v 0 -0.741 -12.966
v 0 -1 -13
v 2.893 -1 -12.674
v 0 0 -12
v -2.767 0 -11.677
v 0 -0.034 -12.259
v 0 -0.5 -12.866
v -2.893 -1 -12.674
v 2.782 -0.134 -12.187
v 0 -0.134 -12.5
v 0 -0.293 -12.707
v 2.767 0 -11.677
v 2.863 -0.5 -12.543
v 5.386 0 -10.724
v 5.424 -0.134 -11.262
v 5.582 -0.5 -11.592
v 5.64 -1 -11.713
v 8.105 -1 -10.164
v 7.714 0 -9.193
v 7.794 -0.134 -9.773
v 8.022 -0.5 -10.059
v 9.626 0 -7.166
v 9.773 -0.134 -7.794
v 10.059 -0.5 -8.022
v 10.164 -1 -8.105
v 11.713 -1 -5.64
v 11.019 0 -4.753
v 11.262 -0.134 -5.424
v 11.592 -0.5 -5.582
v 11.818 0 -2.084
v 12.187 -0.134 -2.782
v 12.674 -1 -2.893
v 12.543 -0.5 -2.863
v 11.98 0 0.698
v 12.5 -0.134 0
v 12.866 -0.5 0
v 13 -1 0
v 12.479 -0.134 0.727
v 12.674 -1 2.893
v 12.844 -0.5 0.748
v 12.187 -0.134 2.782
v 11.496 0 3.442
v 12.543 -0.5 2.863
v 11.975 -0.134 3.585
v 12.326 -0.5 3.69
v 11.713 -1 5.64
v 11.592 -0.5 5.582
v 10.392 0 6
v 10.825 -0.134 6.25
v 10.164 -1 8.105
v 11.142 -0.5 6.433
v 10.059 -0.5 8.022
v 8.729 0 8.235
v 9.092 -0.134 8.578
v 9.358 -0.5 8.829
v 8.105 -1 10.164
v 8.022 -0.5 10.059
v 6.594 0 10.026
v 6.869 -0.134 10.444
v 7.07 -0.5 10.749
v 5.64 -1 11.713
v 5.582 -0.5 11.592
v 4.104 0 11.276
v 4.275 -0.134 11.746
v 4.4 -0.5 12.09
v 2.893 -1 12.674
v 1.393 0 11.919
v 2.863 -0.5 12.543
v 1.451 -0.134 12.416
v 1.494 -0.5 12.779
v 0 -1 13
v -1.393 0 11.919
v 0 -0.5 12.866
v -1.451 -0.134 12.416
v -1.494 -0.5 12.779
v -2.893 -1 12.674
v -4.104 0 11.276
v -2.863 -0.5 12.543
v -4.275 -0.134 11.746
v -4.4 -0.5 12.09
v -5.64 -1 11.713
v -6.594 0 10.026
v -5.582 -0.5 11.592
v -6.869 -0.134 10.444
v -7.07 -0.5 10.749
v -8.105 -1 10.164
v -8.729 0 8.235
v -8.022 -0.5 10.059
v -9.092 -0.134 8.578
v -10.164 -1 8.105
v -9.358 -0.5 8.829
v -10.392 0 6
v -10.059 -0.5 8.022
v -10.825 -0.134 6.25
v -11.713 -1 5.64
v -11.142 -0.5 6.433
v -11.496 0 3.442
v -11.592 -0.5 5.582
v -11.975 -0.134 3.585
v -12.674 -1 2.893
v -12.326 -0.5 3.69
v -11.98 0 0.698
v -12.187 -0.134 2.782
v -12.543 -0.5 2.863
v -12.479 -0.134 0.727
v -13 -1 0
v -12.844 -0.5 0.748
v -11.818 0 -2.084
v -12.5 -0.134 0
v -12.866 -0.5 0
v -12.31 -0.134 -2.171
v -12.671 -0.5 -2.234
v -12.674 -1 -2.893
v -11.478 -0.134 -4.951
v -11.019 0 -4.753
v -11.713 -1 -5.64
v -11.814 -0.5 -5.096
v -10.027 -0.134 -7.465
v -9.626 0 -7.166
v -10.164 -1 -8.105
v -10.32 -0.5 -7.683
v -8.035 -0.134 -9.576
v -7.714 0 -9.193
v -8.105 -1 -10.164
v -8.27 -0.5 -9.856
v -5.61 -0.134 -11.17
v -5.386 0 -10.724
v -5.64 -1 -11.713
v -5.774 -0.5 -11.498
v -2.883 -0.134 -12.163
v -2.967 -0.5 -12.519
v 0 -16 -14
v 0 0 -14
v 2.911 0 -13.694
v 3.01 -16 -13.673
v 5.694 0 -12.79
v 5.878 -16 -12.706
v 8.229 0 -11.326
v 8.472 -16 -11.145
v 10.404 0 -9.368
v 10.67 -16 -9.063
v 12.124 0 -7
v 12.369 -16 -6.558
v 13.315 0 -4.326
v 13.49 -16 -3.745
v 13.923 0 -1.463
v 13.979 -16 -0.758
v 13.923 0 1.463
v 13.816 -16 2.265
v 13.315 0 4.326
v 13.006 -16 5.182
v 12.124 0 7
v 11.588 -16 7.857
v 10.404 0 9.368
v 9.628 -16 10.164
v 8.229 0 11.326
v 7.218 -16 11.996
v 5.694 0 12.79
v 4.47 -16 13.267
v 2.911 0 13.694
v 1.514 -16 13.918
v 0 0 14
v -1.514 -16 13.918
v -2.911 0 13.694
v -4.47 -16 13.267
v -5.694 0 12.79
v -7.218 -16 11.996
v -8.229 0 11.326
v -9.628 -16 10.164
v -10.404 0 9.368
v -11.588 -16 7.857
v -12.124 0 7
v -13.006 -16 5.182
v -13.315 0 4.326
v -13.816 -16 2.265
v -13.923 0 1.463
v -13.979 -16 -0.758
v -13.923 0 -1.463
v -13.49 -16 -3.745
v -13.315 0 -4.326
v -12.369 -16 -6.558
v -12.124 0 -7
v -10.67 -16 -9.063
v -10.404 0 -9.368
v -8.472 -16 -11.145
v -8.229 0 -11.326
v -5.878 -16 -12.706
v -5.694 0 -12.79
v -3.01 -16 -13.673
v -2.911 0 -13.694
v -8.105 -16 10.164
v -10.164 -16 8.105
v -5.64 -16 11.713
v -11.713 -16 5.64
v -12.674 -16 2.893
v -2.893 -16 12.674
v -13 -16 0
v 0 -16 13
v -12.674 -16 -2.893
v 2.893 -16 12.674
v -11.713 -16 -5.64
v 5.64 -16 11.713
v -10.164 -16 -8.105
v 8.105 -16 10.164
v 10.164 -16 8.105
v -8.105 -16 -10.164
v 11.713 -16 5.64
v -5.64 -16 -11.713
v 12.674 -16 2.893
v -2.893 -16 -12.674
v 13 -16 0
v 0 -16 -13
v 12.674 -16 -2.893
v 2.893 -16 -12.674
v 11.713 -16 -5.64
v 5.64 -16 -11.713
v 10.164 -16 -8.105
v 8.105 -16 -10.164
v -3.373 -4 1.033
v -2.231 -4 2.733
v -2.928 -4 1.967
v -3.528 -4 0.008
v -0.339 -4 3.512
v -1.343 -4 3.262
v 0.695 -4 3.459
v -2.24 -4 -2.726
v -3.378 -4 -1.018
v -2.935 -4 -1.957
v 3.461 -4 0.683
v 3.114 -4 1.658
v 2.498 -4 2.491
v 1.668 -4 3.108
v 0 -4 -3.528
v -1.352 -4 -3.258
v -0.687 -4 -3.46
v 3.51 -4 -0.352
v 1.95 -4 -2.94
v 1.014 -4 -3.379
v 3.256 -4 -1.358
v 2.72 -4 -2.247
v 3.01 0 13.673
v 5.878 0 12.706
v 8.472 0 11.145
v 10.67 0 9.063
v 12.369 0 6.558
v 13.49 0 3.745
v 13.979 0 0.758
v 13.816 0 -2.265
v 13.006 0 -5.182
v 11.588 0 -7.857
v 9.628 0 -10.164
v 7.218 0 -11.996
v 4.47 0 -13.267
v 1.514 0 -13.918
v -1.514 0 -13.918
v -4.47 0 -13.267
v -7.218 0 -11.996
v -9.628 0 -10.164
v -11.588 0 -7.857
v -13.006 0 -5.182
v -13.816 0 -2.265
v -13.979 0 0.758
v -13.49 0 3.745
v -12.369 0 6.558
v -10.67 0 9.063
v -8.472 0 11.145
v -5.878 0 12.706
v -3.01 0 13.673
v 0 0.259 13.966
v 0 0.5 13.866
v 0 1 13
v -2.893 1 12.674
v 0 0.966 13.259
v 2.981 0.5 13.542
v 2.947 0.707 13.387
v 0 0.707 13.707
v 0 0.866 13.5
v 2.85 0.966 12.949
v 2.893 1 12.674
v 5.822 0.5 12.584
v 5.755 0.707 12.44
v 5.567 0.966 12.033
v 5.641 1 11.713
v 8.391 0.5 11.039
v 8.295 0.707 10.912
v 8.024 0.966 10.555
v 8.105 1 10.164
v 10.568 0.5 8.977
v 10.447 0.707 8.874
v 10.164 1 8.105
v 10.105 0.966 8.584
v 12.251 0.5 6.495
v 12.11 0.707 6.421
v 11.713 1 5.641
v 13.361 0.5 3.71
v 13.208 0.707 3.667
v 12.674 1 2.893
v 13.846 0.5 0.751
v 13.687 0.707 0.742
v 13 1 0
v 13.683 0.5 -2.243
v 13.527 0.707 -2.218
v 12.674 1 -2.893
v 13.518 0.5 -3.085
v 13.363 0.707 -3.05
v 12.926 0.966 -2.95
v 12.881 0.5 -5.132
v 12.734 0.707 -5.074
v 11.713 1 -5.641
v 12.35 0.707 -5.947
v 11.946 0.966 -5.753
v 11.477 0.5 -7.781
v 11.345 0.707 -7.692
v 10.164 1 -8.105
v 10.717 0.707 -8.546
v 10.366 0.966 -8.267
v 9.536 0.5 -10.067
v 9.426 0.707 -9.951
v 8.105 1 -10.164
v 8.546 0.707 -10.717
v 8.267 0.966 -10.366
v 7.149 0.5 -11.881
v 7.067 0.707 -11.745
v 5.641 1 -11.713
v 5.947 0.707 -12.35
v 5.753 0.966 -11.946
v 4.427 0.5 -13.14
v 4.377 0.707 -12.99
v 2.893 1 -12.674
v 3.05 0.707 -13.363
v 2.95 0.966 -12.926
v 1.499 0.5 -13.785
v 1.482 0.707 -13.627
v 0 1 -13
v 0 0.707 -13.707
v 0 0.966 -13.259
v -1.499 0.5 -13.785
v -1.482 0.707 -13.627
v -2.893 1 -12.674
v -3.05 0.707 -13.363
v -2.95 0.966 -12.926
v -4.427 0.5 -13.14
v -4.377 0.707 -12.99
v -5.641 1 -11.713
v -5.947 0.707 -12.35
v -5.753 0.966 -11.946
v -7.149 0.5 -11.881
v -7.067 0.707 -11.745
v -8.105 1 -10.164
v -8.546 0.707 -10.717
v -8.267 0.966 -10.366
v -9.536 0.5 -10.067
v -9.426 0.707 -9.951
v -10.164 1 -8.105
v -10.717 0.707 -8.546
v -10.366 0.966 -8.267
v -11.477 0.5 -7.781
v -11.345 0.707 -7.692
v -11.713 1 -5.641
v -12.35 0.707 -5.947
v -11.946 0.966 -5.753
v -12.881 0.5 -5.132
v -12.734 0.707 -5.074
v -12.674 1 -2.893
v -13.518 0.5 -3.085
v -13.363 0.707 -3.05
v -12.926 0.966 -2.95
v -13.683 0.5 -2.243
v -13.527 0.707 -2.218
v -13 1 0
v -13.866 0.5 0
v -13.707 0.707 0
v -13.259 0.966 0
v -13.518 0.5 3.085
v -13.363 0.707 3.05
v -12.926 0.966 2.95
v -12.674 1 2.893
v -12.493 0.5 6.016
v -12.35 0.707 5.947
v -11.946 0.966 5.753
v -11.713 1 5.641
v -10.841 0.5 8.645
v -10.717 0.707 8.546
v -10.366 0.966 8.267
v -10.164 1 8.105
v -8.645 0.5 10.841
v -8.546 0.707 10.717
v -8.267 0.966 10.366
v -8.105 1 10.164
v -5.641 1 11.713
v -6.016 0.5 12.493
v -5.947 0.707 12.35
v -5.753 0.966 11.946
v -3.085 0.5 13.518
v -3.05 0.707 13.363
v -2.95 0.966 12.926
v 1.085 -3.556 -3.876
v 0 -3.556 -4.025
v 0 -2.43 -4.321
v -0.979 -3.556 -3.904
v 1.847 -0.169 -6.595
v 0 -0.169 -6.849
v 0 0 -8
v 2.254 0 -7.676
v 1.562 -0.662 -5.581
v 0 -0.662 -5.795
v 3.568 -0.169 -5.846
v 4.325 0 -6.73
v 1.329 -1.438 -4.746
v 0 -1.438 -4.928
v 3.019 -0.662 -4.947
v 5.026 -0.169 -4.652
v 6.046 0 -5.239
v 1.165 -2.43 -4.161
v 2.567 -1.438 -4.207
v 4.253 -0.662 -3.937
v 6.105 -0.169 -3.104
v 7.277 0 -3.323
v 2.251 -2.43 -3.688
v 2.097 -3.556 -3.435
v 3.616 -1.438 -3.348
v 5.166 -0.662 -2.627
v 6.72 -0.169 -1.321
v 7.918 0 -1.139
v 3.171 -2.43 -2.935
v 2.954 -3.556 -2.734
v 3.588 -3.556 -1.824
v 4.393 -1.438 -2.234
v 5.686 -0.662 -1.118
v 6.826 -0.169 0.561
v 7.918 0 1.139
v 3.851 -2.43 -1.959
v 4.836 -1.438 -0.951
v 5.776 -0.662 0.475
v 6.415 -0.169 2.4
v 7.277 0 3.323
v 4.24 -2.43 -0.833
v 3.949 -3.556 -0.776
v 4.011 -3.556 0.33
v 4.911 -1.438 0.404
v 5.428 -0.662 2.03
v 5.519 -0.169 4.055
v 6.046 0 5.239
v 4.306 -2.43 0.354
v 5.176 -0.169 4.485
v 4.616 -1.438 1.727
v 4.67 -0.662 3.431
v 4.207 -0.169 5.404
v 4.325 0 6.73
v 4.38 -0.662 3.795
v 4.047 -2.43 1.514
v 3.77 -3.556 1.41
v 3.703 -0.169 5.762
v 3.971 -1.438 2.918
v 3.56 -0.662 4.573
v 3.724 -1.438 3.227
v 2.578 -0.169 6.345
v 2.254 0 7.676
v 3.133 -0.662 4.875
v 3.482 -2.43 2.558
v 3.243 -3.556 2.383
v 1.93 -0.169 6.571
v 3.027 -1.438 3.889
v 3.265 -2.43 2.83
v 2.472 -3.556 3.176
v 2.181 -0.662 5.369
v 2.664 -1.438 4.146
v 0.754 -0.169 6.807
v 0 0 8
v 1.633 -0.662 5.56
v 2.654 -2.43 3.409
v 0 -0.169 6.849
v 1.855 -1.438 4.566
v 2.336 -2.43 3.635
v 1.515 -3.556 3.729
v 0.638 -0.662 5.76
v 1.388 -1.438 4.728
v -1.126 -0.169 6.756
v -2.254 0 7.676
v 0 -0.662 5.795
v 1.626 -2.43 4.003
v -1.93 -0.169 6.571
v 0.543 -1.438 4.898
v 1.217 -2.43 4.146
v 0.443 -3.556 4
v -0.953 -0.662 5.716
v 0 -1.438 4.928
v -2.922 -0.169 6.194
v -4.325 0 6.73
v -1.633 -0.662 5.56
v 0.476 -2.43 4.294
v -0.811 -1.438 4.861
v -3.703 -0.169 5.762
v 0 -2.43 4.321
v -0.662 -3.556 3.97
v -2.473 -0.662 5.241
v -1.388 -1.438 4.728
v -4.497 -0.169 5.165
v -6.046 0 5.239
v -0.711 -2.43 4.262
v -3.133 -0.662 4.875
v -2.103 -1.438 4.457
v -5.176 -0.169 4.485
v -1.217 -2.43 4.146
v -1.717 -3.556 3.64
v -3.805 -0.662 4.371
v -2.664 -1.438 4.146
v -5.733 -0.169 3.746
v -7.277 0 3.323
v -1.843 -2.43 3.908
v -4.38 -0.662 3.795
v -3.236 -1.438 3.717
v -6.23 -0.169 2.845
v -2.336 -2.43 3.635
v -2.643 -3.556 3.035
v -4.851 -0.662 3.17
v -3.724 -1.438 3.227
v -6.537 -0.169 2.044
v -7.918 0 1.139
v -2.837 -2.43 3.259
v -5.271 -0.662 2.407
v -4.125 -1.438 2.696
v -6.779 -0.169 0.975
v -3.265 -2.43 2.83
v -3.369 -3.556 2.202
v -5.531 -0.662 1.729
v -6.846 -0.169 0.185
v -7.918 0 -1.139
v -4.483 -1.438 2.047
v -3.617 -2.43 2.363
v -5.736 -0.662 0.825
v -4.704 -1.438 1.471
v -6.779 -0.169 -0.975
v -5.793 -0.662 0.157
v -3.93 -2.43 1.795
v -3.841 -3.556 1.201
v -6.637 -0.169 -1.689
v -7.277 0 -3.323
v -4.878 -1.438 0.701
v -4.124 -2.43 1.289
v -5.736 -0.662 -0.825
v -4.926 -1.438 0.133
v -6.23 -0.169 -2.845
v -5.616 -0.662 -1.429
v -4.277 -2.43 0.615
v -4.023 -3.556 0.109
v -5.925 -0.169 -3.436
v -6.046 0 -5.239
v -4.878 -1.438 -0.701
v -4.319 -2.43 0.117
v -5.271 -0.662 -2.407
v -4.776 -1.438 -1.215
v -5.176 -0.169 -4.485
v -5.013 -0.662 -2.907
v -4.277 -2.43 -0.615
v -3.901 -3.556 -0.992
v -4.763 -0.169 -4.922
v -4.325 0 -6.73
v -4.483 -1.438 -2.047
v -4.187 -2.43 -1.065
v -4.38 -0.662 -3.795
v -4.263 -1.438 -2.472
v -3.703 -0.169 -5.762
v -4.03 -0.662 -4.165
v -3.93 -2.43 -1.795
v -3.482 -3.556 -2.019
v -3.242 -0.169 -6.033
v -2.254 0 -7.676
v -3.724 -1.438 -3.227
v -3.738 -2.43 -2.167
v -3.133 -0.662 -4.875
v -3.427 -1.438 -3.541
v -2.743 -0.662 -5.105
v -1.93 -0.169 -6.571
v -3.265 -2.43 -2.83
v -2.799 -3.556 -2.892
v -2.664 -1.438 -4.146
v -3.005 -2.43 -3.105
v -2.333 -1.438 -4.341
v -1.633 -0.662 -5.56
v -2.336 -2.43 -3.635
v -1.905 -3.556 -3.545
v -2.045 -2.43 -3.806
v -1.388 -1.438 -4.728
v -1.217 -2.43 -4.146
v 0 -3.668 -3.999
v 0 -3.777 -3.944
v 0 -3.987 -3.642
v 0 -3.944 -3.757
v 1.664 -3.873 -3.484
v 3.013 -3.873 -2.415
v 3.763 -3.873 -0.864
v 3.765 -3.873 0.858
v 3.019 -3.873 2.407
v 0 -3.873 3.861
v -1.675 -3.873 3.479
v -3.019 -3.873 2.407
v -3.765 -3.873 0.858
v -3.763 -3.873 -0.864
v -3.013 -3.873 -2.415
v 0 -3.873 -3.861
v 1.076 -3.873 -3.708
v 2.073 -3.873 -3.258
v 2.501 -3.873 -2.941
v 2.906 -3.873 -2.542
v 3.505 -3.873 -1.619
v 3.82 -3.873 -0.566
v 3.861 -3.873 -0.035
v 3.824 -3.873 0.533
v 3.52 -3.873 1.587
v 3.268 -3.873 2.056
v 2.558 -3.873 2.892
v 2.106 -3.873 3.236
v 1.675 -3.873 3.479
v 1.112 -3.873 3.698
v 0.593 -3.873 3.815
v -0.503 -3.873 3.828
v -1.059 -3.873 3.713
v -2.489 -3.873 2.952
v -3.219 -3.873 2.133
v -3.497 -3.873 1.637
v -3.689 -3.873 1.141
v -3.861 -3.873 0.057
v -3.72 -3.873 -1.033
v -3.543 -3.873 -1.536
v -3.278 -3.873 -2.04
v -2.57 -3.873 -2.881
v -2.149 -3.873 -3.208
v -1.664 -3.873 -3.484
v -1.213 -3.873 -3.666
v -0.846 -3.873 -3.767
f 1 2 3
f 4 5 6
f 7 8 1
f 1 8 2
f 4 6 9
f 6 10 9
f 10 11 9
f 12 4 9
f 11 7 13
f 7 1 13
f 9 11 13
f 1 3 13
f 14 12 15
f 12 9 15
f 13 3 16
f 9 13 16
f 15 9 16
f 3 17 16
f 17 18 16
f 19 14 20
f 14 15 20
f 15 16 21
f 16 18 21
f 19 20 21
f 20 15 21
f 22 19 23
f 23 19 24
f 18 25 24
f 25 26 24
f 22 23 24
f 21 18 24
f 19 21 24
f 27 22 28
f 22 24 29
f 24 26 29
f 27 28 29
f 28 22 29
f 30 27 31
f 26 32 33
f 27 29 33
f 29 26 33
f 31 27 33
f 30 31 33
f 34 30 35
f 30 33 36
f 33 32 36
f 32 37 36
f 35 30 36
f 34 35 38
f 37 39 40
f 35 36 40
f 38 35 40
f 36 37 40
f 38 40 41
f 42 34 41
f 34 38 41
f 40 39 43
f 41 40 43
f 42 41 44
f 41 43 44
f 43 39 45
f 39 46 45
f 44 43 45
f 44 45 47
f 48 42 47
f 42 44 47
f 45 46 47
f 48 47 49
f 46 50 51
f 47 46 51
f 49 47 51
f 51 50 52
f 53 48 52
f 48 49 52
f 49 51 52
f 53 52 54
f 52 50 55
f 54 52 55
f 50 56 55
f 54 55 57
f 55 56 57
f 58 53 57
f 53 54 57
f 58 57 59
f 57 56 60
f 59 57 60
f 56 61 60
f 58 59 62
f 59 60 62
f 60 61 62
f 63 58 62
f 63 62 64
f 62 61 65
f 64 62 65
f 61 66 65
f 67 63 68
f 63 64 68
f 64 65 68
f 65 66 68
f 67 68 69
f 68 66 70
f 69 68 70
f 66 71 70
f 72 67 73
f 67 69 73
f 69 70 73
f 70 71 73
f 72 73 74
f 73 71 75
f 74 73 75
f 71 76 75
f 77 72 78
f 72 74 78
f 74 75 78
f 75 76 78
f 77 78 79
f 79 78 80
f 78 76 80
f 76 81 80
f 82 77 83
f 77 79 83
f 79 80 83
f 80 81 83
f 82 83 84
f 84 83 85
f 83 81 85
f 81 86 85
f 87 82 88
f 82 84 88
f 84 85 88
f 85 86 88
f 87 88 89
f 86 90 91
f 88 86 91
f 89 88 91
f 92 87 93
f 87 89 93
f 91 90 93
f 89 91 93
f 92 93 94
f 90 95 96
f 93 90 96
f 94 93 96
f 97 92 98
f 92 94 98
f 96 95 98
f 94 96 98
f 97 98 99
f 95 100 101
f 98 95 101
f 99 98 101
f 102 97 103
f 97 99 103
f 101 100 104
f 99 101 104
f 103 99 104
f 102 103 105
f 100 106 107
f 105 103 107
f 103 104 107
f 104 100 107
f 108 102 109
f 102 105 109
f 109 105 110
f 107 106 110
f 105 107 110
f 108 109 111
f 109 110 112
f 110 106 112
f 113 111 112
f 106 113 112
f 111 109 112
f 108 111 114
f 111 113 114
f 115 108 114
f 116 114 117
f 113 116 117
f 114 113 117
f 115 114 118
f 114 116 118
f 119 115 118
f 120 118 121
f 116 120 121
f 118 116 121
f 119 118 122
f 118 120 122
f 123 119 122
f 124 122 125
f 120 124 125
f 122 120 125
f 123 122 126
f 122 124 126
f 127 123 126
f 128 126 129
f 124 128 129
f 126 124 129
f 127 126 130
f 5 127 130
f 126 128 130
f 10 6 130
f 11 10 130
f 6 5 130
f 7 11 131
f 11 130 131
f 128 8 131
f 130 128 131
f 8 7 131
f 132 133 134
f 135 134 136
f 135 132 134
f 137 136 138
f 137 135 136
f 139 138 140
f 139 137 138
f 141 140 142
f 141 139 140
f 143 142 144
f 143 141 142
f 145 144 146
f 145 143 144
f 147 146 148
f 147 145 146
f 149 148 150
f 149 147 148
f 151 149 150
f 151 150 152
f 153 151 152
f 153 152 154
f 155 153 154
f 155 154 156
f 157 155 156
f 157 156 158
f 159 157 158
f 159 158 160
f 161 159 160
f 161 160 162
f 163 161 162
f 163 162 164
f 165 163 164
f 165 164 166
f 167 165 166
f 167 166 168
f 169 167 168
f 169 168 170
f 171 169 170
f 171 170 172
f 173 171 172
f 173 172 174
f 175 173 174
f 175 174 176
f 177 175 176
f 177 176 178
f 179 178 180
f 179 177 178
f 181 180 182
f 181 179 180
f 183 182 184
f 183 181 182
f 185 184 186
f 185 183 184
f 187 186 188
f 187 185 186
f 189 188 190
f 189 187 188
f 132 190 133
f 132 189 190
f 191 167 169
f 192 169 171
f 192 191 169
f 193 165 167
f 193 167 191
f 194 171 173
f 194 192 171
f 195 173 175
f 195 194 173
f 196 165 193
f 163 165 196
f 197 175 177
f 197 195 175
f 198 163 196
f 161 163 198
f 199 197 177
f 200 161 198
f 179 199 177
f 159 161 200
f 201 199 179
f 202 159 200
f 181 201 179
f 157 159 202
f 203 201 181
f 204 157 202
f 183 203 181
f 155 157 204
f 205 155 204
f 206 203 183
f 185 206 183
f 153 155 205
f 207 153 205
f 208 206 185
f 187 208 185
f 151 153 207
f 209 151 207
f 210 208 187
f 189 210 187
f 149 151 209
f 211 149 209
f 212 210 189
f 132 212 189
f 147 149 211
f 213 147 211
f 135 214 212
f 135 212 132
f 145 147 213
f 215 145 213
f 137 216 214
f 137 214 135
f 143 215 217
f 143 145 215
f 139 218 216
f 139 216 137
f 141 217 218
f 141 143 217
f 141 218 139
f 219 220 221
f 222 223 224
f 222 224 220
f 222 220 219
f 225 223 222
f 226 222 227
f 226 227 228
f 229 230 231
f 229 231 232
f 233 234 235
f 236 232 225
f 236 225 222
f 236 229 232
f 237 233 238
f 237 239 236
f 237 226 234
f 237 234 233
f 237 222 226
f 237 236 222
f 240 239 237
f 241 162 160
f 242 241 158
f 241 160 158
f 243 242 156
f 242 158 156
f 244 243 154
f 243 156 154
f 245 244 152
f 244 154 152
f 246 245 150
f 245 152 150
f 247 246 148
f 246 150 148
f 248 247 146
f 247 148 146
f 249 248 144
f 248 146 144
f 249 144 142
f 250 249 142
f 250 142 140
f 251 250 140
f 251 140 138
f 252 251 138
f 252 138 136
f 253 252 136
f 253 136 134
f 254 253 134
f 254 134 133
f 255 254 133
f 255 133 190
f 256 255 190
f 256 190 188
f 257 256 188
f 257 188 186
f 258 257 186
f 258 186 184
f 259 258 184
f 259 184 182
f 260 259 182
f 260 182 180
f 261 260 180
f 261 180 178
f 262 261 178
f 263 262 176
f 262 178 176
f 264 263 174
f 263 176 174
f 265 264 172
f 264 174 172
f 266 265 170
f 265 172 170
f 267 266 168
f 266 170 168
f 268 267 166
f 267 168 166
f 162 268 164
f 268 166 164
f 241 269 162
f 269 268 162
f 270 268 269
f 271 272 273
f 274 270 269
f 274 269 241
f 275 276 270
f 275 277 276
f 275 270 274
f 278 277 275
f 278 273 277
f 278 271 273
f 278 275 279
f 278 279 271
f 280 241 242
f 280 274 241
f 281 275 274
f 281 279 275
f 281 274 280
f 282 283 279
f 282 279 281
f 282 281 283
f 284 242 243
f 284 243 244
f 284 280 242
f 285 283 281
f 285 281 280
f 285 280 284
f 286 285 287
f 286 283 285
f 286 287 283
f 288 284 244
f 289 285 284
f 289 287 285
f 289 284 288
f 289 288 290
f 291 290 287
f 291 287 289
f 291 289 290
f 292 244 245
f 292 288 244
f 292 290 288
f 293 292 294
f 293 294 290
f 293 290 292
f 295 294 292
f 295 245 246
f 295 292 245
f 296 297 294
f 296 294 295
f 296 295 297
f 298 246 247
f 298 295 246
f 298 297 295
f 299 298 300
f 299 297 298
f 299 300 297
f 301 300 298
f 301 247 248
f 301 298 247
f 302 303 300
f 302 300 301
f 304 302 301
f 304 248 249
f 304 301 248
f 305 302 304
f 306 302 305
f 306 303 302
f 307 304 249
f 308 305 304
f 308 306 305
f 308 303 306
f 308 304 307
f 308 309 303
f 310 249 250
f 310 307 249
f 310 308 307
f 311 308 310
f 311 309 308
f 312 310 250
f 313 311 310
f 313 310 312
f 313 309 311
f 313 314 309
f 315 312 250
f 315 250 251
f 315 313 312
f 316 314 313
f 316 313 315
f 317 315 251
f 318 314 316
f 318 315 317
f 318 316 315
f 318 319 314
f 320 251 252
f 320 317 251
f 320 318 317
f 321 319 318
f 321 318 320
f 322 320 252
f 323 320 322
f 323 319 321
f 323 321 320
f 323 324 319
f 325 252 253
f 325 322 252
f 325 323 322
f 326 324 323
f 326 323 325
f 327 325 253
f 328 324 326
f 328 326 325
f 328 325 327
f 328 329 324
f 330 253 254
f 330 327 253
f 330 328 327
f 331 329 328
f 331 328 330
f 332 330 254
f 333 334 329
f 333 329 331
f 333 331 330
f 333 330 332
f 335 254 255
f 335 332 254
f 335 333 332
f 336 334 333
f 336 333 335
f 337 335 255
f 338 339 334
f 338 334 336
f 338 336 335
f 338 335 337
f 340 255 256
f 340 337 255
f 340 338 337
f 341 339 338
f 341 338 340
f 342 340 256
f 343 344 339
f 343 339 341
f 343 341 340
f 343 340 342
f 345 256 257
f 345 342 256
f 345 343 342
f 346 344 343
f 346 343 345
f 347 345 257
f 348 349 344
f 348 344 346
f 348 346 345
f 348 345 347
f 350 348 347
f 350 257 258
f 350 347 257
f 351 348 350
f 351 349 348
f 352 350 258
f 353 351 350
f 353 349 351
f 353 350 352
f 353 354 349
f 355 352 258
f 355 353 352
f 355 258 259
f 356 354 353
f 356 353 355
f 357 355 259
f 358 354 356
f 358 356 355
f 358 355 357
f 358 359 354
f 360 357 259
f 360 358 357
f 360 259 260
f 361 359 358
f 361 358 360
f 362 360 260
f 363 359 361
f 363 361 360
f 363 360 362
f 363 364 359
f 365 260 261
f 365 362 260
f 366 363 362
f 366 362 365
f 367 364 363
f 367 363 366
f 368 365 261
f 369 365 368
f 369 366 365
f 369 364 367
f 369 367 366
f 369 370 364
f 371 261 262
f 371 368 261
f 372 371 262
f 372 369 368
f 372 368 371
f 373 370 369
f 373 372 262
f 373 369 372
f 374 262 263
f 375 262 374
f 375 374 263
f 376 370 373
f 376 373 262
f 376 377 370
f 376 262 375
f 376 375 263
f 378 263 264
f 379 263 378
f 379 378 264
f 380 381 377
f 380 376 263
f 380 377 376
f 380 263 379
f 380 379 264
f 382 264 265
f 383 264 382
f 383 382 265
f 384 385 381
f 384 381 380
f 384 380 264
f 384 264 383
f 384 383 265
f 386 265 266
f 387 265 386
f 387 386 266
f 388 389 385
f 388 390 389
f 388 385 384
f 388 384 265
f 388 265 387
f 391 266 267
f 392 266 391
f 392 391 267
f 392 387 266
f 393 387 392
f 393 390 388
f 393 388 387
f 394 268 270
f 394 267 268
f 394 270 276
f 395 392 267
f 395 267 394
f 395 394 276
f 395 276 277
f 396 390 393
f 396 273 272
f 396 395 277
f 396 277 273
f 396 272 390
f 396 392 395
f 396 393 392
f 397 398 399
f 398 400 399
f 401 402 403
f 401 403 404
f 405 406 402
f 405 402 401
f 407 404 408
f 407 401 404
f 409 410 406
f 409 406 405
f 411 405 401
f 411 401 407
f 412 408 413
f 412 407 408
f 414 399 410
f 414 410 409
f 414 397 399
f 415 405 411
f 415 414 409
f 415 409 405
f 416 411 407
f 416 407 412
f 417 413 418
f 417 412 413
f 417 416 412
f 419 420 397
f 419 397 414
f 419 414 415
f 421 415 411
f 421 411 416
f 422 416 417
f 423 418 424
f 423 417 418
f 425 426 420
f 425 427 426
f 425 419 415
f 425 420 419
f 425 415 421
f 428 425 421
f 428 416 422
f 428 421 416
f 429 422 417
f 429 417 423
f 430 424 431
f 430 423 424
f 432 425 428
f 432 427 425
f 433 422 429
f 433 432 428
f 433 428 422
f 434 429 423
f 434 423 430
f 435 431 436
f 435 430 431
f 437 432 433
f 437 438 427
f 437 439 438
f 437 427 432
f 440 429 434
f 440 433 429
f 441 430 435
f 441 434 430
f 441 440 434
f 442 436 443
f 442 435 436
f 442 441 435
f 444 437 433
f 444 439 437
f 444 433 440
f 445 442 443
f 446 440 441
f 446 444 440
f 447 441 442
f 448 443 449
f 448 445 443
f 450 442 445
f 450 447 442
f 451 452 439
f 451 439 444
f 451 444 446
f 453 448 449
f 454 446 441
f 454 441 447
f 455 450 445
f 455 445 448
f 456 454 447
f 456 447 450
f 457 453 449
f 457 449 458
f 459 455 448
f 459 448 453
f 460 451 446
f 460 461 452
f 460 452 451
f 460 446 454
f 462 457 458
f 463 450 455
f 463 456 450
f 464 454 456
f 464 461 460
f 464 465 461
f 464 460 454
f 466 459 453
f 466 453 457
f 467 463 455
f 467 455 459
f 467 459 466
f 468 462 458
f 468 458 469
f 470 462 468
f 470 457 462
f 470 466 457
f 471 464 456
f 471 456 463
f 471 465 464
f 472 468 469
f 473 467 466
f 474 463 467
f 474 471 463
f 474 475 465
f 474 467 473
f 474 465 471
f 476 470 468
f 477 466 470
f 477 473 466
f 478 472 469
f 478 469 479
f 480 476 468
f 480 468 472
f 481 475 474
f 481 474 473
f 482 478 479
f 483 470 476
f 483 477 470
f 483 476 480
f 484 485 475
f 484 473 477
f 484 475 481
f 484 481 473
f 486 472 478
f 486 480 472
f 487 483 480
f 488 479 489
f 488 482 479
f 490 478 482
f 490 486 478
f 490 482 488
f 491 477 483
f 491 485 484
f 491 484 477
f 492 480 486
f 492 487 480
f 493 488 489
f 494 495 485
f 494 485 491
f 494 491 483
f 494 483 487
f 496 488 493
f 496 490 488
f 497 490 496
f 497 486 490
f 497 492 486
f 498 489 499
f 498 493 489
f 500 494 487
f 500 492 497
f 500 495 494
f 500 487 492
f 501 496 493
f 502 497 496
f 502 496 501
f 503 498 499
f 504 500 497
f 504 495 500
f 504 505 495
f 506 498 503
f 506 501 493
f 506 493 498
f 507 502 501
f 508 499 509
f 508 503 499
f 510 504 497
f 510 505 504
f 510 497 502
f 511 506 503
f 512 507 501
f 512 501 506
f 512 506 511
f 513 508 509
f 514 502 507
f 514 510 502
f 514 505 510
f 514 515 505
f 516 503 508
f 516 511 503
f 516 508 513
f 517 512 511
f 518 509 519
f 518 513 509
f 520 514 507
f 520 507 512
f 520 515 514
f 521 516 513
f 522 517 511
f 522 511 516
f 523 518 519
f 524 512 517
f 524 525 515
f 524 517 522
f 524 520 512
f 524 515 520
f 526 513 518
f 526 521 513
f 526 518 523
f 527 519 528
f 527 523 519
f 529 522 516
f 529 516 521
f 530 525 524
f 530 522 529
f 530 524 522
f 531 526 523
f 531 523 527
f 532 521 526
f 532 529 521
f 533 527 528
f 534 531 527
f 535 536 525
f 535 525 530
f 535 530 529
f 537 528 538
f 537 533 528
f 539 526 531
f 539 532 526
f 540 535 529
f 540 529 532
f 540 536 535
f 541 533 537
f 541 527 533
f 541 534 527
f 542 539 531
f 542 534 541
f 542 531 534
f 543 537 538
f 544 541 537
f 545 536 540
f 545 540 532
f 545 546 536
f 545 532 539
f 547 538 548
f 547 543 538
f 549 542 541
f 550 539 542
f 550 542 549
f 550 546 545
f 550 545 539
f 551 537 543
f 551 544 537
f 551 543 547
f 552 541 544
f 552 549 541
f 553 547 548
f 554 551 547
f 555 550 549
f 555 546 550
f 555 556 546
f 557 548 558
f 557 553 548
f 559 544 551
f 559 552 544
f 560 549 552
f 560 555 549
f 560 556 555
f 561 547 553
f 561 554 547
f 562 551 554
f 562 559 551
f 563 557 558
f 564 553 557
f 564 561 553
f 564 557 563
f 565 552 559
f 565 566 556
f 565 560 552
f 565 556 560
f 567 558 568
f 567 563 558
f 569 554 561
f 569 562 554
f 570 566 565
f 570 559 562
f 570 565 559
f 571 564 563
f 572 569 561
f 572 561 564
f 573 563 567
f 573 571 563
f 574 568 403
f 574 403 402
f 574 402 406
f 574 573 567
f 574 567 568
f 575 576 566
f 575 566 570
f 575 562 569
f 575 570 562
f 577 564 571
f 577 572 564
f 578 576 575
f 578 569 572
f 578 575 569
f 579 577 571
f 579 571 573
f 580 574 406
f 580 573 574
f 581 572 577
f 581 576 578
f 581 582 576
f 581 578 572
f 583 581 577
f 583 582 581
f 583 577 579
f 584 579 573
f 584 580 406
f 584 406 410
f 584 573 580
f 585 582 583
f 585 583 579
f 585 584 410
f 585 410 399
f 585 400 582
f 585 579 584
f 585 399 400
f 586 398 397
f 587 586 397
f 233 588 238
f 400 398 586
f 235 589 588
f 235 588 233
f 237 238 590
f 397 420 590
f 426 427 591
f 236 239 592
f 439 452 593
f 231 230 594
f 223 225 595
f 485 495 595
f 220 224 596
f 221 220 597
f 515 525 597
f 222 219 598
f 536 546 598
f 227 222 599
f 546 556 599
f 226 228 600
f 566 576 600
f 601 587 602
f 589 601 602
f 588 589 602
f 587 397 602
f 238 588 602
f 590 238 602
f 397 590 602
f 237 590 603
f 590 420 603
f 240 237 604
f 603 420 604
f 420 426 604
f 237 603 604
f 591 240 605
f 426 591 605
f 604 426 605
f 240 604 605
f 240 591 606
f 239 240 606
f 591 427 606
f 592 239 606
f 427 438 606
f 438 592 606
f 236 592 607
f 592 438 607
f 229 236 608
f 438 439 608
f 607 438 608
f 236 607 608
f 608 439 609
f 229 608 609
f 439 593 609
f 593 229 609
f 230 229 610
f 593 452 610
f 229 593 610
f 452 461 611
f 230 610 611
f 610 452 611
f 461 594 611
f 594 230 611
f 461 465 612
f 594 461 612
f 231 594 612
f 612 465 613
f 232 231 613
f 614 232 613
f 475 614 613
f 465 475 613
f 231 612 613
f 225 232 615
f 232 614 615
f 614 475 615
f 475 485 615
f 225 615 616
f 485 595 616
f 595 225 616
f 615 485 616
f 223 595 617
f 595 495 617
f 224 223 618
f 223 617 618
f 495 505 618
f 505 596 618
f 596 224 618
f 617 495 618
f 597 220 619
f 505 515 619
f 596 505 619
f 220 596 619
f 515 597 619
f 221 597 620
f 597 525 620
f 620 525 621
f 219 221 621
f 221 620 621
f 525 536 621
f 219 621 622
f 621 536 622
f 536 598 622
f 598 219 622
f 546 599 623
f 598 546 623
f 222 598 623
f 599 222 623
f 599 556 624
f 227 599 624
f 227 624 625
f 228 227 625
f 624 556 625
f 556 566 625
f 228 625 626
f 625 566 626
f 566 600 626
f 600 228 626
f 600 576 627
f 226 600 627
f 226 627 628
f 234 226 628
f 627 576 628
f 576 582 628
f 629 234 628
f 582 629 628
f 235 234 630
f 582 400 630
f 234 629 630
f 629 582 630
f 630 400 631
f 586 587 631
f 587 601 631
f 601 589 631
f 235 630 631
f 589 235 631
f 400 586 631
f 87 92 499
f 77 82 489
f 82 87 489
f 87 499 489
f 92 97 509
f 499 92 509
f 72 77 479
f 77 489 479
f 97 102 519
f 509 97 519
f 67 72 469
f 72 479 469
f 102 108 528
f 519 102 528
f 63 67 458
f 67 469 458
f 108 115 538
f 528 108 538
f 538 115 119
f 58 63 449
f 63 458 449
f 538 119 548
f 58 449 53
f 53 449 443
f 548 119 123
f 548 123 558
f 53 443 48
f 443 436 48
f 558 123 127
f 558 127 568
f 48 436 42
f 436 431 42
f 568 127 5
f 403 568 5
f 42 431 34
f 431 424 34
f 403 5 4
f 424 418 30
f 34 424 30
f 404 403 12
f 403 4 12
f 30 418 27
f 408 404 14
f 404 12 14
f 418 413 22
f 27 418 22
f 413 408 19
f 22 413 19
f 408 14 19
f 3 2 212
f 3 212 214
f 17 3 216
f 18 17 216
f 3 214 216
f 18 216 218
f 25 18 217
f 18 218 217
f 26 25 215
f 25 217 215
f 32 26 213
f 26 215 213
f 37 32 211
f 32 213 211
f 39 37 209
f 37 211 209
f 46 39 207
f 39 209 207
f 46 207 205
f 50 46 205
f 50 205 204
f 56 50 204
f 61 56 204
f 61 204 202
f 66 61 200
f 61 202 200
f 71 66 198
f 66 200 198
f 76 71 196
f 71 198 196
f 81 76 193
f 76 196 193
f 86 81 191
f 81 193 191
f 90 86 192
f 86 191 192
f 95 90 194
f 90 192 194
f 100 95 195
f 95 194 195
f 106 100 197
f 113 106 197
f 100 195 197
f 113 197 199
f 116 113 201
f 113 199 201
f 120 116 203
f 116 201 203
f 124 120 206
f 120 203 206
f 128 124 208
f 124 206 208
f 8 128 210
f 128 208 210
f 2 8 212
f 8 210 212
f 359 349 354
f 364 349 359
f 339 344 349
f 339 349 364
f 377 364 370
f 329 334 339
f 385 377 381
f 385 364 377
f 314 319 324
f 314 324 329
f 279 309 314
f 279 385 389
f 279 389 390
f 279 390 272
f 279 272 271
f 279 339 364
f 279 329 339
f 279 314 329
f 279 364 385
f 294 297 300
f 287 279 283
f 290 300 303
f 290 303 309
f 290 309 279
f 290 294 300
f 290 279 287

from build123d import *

# Parameters (mm, degrees)
SKETCH1_R           = 14
SKETCH1_R_2         = 13
BOSS_EXTRUDE1_DEPTH = 1
SKETCH2_R           = 4
BOSS_EXTRUDE2_DEPTH = 4
BOSS_EXTRUDE3_START = 16
SKETCH2_4_R         = 14
SKETCH2_4_R_2       = 13
BOSS_EXTRUDE3_DEPTH = 16
FILLET1_R           = 4
FILLET2_R           = 0.5
FILLET3_R           = 1


with BuildPart() as part:
    # Sketch1 → Boss-Extrude1 (new body)
    # profile 1 of 2: a face of its own
    with BuildSketch(Plane(origin=(0, 0, 0), x_dir=(1, 0, 0), z_dir=(0, 1, 0))):
        with Locations(Location((0, 0, 0), (0, 0, 270))):
            Circle(SKETCH1_R)
        Circle(SKETCH1_R_2, mode=Mode.SUBTRACT)
    # profile 2 of 2: a face of its own
    with BuildSketch(Plane(origin=(0, 0, 0), x_dir=(1, 0, 0), z_dir=(0, 1, 0))):
        Circle(SKETCH1_R_2)
    extrude(amount=BOSS_EXTRUDE1_DEPTH)

    # Sketch2 → Boss-Extrude2 (add)
    with BuildSketch(Plane.XZ):
        with Locations(Location((0, 0, 0), (0, 0, 270))):
            Circle(SKETCH2_R)
    extrude(amount=BOSS_EXTRUDE2_DEPTH)

    # Sketch2<4> → Boss-Extrude3 (add)
    with BuildSketch(Plane.XZ.offset(BOSS_EXTRUDE3_START)):
        with Locations(Location((0, 0, 0), (0, 0, 270))):
            Circle(SKETCH2_4_R)
        with Locations(Location((0, 0, 0), (0, 0, 270))):
            Circle(SKETCH2_4_R_2, mode=Mode.SUBTRACT)
    extrude(amount=-BOSS_EXTRUDE3_DEPTH)

    # Fillet1
    fillet1_edges = [part.edges().sort_by_distance(p)[0] for p in [
        (0, 0, 4),
    ]]
    fillet(fillet1_edges, radius=FILLET1_R - 0.0001)  # a hair under: the kernel refuses the full size

    # Fillet2
    fillet2_edges = [part.edges().sort_by_distance(p)[0] for p in [
        (0, -4, 4),
    ]]
    fillet(fillet2_edges, radius=FILLET2_R)

    # Fillet3
    fillet3_edges = [part.edges().sort_by_distance(p)[0] for p in [
        (0, 0, 13),
        (0, 1, -14),
    ]]
    fillet(fillet3_edges, radius=FILLET3_R - 0.0001)  # a hair under: the kernel refuses the full size


solid = part.part
